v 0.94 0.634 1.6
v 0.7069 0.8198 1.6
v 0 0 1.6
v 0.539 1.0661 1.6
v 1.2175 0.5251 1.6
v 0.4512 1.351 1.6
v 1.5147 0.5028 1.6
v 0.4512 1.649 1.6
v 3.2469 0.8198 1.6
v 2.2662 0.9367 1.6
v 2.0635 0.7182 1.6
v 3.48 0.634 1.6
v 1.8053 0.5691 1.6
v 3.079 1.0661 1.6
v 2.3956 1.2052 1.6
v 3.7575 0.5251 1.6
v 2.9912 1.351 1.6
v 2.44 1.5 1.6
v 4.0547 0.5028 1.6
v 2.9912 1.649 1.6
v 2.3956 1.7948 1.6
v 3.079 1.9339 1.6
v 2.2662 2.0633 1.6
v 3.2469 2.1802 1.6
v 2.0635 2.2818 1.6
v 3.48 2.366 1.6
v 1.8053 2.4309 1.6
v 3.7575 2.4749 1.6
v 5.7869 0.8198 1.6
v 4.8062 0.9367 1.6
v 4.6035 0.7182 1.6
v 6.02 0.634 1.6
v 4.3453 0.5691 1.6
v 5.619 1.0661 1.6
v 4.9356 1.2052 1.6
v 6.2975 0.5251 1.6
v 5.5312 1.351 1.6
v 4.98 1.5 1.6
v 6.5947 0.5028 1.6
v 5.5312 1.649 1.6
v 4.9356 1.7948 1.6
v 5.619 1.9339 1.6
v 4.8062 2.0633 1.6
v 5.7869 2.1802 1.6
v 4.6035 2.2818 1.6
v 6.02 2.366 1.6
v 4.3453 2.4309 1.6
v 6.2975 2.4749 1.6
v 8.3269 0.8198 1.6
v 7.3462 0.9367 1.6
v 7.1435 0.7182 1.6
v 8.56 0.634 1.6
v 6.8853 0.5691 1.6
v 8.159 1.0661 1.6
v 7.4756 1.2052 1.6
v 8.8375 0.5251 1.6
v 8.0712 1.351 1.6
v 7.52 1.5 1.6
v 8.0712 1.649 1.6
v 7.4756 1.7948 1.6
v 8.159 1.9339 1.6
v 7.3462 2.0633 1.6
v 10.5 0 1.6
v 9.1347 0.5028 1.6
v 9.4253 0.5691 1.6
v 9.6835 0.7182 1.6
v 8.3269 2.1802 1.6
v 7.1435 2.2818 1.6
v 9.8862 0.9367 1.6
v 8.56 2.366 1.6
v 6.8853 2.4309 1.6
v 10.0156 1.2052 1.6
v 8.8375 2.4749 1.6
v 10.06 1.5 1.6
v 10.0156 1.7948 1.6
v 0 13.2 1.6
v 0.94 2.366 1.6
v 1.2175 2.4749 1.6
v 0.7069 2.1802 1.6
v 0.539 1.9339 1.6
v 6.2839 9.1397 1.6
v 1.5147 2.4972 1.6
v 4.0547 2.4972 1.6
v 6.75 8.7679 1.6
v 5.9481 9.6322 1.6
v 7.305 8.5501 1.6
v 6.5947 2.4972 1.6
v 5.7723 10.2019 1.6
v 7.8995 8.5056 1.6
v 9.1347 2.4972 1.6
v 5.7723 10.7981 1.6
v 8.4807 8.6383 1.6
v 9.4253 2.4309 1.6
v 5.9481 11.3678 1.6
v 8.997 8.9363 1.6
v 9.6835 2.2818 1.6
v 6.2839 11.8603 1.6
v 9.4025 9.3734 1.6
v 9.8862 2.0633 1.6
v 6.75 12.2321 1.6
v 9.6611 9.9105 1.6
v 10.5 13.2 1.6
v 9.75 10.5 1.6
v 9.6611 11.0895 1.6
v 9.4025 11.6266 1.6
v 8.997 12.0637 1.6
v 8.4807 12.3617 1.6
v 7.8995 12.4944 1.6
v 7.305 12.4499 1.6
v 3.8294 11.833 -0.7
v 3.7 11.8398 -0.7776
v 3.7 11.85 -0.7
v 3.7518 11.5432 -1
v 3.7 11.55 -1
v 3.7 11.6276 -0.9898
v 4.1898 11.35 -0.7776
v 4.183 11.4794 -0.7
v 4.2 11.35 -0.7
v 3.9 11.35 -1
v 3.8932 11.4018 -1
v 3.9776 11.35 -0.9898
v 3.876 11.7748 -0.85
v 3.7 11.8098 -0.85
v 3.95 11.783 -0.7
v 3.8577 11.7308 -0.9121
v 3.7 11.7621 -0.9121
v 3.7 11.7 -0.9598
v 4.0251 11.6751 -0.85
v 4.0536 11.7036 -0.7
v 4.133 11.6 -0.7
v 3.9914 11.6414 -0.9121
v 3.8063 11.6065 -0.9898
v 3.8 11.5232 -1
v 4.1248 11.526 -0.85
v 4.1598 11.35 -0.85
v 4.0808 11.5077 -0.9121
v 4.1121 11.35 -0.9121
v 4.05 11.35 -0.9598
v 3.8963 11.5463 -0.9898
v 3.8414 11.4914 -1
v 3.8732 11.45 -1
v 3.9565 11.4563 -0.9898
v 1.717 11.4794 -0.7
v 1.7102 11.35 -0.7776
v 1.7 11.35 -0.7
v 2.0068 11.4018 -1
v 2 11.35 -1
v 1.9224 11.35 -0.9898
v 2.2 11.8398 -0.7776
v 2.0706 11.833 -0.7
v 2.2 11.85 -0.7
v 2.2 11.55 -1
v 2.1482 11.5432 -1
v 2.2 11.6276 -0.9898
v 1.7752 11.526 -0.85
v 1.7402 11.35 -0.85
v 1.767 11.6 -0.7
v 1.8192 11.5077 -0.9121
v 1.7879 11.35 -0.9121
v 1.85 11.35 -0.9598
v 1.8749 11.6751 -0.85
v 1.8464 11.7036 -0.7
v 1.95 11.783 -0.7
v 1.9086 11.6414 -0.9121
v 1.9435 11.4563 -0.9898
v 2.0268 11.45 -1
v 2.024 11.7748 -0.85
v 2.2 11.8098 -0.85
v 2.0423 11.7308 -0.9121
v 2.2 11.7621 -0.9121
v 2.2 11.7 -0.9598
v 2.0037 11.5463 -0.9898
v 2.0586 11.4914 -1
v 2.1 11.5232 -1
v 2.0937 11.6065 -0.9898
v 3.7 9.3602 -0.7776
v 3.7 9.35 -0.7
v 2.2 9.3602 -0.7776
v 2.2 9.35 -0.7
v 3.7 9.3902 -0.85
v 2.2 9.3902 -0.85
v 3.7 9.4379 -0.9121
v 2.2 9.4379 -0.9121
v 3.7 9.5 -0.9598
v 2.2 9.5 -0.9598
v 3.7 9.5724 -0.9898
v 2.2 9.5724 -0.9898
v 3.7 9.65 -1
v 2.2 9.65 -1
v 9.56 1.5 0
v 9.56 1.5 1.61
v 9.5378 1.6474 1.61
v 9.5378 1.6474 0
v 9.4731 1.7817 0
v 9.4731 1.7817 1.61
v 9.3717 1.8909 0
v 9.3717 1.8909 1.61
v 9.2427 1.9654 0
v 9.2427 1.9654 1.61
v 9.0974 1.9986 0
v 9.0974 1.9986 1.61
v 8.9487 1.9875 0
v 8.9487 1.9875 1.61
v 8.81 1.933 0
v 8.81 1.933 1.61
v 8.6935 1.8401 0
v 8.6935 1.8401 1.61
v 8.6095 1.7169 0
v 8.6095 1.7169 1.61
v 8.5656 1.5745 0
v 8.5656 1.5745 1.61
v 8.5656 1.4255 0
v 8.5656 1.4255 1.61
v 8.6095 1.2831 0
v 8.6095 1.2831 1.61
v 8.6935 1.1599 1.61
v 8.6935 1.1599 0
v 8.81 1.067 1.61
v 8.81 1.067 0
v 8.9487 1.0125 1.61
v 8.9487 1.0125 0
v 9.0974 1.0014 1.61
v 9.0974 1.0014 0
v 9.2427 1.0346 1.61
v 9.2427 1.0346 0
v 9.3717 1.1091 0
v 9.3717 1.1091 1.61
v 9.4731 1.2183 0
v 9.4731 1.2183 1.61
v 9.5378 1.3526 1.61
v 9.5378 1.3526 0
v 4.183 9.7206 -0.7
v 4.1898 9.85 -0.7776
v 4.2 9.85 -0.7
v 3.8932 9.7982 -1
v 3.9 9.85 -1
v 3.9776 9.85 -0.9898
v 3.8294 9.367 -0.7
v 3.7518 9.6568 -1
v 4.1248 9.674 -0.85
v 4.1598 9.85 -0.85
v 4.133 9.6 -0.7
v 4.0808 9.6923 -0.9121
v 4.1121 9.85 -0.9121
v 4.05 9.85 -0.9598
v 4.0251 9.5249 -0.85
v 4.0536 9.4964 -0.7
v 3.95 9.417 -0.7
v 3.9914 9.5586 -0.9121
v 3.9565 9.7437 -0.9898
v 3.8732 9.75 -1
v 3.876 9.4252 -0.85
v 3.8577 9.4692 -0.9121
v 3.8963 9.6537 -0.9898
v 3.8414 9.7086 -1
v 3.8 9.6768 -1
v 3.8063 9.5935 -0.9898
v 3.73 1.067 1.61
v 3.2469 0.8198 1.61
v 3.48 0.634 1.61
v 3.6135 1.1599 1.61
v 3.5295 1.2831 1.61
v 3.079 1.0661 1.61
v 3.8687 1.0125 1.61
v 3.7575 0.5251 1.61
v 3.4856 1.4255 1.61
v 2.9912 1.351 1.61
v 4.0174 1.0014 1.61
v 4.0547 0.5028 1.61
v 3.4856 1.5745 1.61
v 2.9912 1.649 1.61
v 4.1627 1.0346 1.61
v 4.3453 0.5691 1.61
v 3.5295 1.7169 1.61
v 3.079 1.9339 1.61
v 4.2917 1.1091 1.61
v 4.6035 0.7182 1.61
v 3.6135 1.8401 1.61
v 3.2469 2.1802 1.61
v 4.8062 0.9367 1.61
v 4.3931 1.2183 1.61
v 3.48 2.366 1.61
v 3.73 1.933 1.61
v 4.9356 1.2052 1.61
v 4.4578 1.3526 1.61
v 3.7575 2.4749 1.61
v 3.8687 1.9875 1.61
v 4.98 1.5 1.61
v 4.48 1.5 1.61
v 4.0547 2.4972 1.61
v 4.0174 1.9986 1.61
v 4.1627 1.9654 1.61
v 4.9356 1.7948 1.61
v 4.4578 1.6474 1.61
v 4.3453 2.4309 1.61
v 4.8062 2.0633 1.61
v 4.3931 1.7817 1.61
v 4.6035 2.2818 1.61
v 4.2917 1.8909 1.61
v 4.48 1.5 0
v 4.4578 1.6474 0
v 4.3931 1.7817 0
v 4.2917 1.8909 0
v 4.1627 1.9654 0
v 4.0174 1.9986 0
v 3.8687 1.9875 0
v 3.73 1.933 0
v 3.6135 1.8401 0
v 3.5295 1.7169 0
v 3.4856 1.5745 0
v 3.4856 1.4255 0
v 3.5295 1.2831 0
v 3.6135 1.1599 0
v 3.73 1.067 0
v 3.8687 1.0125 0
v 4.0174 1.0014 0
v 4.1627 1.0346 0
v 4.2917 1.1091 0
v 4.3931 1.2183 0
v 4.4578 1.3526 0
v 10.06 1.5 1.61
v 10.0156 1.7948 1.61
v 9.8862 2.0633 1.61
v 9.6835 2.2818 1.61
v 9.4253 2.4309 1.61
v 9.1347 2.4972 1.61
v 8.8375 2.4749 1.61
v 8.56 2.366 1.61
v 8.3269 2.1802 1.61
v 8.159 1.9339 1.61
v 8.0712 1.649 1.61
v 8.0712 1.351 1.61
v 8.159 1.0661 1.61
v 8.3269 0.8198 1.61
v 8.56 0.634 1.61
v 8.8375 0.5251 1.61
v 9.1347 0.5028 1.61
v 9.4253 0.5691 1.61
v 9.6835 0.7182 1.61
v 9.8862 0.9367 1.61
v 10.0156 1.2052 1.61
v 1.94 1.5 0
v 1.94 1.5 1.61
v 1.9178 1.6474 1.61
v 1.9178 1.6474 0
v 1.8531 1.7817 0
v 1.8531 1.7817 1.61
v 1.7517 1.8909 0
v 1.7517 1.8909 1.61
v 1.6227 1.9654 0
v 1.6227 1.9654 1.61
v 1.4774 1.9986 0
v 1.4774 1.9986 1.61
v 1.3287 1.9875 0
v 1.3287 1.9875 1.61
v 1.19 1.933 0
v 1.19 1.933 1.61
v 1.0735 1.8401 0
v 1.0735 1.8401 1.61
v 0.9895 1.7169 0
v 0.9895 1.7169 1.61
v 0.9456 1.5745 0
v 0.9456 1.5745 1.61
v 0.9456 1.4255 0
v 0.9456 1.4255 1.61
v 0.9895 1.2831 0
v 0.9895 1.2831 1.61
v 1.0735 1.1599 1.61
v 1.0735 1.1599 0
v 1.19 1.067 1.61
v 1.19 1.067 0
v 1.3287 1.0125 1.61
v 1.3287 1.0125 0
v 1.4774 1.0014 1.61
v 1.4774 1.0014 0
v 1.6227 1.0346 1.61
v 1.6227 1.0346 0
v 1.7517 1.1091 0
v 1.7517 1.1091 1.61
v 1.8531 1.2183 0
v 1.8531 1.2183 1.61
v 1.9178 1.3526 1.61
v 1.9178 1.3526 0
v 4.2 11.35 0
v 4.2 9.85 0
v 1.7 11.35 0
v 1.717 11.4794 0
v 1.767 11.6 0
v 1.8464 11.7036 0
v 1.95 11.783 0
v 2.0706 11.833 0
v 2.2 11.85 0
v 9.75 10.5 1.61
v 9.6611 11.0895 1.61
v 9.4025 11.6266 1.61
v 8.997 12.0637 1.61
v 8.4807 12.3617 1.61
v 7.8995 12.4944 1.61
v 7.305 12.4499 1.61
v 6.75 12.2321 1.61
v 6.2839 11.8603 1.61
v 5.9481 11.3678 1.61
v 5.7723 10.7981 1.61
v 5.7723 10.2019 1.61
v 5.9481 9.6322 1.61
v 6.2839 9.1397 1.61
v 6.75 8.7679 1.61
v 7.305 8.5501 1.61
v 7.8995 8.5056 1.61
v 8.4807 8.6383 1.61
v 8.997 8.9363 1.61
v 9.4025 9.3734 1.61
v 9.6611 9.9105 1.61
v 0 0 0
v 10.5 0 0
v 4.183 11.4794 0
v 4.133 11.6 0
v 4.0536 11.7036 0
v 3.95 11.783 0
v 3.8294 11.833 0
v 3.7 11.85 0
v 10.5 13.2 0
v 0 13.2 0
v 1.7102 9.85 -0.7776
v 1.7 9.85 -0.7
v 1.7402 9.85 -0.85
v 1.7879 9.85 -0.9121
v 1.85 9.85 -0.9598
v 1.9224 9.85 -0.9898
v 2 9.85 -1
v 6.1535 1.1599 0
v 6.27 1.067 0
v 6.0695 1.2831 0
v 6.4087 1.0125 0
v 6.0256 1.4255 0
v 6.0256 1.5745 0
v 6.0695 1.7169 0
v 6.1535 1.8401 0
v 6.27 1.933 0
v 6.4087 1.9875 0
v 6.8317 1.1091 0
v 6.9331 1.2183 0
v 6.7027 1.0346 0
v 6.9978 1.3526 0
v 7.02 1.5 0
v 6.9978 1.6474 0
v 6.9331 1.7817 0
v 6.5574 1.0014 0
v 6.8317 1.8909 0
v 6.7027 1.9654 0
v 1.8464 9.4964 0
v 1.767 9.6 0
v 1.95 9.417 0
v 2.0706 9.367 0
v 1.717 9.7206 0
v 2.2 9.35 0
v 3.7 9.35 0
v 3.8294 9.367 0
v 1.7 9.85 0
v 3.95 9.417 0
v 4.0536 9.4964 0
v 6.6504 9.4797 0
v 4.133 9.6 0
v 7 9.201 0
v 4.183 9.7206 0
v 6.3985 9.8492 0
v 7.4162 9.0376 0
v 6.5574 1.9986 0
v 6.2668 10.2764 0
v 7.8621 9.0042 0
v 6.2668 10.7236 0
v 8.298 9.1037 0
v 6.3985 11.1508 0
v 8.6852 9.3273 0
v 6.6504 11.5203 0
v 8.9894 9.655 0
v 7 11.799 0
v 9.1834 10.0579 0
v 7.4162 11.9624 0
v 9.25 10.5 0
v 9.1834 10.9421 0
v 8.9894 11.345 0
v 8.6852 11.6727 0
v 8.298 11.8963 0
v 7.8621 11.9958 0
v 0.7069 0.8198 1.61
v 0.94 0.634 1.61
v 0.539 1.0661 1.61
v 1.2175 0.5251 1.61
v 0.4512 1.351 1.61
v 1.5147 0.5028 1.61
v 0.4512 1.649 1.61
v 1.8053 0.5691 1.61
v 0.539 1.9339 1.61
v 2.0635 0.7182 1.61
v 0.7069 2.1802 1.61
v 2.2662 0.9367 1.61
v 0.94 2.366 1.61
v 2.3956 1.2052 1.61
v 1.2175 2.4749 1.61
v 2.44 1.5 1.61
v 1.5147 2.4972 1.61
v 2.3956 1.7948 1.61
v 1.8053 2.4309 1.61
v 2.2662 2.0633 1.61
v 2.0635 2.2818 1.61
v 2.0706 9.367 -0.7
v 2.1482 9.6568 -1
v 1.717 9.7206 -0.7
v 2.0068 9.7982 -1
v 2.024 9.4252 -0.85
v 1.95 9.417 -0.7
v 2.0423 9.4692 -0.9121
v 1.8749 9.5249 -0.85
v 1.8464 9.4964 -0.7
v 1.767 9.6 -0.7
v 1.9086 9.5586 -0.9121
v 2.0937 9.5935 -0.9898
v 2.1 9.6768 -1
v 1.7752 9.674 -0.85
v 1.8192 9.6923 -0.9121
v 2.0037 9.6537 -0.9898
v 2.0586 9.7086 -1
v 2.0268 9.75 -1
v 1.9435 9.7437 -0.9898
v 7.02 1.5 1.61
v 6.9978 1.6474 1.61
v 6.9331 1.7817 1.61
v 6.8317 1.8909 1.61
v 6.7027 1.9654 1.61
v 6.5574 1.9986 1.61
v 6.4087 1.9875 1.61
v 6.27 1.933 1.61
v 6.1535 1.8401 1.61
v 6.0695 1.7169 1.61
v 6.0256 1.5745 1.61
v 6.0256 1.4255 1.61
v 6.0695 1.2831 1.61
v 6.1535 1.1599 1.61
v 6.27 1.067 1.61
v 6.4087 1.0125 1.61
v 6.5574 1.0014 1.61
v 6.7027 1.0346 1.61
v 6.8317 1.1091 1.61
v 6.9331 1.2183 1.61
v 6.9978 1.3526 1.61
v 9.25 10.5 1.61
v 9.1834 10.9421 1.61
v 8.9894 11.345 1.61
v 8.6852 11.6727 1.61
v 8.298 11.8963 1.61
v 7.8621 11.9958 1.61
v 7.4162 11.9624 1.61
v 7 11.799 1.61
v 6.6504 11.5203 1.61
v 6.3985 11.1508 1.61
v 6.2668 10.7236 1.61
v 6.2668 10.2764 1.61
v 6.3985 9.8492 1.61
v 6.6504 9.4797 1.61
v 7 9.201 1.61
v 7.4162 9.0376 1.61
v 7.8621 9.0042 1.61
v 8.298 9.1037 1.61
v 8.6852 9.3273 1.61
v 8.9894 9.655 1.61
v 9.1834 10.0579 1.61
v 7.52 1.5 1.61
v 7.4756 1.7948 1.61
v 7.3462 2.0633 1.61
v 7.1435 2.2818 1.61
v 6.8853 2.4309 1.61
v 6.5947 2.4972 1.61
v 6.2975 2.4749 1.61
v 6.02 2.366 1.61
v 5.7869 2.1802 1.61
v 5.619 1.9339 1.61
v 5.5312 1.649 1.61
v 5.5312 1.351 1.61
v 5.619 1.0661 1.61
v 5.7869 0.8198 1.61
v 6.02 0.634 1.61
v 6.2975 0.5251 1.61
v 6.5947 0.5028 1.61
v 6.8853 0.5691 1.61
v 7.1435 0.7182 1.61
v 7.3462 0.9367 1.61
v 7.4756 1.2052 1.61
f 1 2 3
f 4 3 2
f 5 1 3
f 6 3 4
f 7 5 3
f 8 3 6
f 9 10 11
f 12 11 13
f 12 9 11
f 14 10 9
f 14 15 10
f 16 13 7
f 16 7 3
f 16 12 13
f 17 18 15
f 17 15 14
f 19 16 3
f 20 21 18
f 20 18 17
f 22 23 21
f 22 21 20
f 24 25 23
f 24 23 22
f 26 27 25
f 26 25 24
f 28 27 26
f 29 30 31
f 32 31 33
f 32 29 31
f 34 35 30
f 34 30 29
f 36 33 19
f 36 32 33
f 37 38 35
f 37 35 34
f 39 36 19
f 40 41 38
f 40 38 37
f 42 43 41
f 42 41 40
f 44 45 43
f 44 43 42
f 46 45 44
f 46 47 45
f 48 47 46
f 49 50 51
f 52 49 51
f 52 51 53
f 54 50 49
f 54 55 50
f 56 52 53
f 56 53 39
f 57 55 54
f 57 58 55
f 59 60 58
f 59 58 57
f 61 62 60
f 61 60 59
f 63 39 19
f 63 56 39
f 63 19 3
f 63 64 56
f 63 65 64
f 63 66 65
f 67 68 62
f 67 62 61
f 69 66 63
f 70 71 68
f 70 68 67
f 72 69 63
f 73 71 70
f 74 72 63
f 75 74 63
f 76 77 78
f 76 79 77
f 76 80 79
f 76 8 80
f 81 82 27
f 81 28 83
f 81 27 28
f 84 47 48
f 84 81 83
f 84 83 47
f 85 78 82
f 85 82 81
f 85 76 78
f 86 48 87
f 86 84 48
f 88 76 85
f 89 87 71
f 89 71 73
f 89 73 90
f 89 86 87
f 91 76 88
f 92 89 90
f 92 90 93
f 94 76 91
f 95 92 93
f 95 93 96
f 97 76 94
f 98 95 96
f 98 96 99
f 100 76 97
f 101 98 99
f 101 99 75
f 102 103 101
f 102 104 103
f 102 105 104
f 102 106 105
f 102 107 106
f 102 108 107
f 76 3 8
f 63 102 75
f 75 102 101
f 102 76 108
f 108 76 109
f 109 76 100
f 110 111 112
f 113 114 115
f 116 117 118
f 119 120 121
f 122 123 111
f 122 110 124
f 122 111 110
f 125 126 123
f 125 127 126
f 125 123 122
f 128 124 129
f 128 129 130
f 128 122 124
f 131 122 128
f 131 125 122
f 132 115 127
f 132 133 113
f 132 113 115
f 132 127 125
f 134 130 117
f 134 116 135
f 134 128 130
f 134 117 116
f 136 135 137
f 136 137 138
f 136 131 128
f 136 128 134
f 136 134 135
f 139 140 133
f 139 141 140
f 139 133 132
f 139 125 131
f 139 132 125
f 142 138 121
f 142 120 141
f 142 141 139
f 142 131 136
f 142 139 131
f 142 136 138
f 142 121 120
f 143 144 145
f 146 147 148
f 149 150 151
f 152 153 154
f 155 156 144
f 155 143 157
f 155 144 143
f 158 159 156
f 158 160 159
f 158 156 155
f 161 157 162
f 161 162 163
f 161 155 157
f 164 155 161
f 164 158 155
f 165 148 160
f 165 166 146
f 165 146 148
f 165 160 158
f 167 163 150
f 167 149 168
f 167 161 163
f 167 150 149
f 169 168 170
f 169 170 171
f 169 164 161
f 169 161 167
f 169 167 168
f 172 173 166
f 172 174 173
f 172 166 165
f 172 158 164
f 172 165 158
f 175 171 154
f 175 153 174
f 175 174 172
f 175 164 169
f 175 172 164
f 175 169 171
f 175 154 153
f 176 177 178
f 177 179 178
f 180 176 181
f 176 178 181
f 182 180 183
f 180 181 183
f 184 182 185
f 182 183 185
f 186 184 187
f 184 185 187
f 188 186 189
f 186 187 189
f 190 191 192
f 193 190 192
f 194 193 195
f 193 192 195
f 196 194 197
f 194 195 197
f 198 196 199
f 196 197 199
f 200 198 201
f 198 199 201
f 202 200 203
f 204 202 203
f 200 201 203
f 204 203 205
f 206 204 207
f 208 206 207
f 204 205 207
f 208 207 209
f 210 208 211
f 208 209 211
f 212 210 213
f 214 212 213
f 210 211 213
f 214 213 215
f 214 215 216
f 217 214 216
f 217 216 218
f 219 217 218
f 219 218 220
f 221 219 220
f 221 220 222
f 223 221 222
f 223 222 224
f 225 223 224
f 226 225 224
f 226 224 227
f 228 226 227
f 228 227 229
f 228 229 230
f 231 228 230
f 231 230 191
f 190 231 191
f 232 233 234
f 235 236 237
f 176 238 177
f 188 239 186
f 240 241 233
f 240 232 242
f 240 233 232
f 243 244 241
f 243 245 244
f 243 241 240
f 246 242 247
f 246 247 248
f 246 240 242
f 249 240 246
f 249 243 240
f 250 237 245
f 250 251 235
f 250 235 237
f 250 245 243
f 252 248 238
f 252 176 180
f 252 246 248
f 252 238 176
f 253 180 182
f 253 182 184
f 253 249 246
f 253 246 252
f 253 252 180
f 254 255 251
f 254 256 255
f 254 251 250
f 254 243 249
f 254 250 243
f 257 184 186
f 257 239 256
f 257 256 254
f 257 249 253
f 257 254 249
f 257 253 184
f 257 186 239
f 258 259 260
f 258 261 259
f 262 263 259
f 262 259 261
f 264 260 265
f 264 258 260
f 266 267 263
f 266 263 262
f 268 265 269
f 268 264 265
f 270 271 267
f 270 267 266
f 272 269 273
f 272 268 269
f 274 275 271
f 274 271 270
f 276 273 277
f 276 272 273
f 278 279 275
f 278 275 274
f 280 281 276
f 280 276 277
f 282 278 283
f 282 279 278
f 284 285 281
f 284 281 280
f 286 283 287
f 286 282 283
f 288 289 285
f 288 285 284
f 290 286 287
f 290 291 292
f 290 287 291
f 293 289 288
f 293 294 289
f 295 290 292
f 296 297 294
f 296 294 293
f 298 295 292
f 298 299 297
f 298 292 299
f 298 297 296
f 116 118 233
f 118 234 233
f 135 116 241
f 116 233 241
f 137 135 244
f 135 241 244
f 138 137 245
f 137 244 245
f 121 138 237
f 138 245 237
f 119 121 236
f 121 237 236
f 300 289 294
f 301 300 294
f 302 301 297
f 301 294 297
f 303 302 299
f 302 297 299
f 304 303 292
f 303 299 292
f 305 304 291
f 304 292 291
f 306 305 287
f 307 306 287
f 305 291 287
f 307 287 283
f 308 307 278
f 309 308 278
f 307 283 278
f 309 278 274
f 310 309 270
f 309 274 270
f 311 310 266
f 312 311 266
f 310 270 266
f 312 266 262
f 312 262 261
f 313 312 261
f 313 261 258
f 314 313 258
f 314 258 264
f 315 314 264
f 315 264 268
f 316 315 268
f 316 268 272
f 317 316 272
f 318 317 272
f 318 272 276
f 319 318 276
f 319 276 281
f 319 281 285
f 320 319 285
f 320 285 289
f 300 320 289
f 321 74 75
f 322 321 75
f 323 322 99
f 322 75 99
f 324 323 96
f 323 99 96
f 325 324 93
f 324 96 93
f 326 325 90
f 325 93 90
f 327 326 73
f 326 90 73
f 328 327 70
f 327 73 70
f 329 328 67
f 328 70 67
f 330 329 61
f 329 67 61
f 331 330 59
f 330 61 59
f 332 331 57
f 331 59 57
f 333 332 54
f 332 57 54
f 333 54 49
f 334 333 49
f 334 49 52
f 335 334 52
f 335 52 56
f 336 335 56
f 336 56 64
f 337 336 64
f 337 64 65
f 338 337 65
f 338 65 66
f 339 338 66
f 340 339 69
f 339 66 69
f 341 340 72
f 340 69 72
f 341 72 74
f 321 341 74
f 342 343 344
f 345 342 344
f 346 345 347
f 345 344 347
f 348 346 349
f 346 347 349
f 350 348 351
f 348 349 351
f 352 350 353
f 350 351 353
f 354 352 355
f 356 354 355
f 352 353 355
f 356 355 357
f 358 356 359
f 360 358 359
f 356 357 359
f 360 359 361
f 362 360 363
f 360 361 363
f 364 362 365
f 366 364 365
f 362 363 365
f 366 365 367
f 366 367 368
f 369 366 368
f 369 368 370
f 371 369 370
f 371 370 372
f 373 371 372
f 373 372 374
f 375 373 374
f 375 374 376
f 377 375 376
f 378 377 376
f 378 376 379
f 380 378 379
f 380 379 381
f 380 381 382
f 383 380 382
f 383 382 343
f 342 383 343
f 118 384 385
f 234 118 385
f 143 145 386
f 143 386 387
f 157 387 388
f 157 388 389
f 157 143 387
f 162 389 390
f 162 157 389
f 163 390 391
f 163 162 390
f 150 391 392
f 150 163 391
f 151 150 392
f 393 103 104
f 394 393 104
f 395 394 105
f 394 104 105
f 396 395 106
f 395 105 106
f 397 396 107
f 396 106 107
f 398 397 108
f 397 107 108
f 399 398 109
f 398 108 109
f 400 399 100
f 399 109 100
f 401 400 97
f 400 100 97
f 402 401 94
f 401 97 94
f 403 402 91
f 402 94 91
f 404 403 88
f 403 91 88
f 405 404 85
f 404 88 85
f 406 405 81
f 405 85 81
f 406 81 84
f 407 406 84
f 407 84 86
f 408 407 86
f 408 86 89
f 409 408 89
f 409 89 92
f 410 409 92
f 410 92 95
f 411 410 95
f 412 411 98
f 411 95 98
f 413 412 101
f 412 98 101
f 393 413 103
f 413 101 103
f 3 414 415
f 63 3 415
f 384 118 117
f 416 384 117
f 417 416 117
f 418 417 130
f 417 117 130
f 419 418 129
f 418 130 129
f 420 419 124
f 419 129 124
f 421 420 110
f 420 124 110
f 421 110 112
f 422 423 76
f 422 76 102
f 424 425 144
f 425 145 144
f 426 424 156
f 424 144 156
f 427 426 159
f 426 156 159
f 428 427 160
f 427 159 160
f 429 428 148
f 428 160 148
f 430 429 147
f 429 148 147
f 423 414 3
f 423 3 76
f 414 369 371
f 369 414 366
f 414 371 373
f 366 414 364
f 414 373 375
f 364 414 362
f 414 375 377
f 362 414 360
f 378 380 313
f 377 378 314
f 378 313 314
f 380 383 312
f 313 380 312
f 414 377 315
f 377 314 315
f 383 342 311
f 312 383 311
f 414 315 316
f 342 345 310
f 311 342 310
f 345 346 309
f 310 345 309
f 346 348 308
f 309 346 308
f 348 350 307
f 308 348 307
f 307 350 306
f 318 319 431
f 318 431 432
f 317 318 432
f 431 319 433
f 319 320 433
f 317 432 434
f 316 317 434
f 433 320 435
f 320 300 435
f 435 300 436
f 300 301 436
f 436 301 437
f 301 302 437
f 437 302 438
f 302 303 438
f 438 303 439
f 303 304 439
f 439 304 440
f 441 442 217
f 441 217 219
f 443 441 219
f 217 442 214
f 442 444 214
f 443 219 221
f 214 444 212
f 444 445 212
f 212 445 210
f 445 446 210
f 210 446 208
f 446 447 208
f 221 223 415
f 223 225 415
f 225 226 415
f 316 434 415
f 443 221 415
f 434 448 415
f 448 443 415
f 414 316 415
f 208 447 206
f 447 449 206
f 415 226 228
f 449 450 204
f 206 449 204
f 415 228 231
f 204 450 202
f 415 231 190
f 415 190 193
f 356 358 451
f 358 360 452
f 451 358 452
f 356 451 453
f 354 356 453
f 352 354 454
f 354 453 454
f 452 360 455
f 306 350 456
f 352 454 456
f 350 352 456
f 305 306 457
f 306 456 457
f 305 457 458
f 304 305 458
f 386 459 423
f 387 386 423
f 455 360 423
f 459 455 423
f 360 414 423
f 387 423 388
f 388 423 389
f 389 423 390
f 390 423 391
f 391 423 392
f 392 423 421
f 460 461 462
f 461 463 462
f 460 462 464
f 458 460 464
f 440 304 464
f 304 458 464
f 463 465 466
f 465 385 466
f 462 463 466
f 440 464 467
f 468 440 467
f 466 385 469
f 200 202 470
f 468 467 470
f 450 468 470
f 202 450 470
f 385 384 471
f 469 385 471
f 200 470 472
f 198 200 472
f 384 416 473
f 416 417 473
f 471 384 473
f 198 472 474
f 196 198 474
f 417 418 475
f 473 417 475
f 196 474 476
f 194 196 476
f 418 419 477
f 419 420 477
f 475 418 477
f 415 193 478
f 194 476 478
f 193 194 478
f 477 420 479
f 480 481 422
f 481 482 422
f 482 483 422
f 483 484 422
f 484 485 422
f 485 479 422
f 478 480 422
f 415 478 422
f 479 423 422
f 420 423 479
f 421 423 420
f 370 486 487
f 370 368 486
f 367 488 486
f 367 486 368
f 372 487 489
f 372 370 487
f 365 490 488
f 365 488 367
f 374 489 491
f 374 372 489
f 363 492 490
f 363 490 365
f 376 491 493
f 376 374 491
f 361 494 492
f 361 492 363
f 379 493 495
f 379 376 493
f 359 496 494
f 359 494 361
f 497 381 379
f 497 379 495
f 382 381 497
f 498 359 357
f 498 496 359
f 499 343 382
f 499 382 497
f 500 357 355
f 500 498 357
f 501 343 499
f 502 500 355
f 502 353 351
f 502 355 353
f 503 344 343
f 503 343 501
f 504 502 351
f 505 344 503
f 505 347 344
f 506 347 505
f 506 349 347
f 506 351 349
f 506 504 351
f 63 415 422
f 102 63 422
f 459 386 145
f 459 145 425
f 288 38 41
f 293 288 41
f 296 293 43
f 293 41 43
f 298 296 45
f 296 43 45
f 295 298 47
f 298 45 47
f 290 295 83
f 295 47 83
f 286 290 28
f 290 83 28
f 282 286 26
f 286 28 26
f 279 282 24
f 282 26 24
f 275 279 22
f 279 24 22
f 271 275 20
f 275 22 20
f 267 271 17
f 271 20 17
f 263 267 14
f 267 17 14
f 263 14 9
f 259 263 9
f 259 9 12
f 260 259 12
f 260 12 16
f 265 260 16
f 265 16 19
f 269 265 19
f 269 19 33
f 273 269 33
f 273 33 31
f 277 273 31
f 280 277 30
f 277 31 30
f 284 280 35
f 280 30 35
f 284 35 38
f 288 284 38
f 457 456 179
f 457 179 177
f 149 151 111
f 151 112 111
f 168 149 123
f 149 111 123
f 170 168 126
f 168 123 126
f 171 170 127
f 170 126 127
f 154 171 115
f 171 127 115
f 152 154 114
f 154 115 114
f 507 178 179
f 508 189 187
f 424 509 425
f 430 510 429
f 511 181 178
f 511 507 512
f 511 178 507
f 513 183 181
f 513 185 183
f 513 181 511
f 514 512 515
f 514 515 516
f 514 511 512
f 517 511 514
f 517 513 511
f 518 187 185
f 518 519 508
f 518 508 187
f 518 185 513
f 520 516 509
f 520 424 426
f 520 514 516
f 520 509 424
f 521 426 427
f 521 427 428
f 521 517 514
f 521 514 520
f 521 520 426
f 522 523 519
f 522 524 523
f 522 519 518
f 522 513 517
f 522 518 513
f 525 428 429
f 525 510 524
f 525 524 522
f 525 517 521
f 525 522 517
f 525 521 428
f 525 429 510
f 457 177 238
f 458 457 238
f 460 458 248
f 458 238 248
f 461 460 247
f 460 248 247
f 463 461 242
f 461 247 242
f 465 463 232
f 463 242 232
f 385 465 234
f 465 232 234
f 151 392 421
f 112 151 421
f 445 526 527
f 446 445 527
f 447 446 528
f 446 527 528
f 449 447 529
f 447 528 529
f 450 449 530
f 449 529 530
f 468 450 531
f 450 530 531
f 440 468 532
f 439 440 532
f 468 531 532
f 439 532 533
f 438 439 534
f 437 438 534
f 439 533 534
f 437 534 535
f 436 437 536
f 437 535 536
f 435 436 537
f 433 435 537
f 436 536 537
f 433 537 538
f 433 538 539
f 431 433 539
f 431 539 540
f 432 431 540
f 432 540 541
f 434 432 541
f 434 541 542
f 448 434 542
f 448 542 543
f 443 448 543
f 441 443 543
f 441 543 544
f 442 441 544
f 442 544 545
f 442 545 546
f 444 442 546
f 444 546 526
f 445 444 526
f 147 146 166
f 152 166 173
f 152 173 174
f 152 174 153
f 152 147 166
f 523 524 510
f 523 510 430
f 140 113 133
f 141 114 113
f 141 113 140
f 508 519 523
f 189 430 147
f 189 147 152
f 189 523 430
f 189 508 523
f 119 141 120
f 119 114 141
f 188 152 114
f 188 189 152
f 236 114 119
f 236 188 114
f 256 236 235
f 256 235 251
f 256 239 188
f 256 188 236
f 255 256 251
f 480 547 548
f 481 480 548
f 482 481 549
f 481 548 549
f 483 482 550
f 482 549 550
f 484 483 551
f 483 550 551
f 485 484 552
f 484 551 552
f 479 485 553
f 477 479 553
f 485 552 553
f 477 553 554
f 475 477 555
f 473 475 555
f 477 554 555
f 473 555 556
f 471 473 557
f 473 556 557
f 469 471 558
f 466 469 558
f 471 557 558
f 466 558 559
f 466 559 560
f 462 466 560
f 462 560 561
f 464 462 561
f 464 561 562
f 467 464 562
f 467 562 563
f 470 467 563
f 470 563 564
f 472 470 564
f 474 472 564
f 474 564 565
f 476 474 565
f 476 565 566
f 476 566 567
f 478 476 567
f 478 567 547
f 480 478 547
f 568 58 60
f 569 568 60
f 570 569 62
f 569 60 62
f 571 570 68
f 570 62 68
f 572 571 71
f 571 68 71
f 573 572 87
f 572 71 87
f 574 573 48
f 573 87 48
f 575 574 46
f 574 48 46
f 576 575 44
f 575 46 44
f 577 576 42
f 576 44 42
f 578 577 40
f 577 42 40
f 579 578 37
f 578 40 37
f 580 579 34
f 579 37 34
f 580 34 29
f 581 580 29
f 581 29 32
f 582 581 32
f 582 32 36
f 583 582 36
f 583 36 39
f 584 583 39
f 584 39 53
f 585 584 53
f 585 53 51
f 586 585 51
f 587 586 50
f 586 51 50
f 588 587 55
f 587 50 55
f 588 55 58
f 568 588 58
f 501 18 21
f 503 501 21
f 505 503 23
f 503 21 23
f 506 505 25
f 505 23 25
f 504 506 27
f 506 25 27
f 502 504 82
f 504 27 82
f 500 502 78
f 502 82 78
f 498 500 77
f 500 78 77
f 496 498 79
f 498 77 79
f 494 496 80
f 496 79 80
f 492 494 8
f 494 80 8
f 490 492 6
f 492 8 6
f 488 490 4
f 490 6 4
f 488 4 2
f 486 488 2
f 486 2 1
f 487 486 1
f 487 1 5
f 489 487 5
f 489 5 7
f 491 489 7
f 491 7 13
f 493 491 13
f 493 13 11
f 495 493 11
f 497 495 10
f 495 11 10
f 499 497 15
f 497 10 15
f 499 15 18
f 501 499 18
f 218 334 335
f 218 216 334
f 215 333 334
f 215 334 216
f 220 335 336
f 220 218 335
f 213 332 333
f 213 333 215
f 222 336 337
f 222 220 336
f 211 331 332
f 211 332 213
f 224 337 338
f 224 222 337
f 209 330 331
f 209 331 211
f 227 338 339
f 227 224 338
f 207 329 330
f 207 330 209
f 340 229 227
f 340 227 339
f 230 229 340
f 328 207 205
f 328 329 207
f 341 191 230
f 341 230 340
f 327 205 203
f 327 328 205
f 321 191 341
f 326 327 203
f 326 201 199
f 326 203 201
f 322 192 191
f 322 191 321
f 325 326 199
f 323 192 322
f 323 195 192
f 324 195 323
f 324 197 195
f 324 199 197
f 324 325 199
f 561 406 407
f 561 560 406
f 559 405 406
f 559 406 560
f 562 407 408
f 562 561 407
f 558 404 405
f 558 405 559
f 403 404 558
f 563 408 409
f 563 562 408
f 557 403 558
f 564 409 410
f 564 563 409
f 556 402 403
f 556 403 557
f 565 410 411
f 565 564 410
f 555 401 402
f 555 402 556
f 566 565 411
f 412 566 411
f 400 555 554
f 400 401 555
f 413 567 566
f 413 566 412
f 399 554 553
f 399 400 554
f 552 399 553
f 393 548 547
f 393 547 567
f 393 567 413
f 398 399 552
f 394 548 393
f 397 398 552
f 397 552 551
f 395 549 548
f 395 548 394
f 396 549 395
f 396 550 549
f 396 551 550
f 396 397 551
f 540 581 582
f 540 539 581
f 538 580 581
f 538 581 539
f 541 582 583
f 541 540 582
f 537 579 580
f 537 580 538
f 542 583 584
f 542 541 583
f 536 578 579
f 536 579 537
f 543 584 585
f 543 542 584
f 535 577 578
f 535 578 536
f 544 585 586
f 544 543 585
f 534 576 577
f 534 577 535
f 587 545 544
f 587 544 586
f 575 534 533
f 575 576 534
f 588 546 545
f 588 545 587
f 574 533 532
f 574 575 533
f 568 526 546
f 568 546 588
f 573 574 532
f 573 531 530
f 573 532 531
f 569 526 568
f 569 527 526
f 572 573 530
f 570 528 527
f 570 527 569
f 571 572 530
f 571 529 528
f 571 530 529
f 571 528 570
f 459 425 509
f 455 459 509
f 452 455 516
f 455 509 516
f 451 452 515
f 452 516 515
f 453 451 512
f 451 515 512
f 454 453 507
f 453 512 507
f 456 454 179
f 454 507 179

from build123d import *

# Parameters (mm, degrees)
BOX_W         = 10.5
BOX_H         = 13.2
BOX_DEPTH     = 1.6
SKETCH_R      = 1
SKETCH_R_2    = 2
PAD_DEPTH     = 0.01
SKETCH001_R   = 1.5
SKETCH001_R_2 = 0.5
POCKET_DEPTH  = 1.611
SKETCH002_W   = 2.5
SKETCH002_H   = 2.5
PAD001_DEPTH  = 1
FILLET_R      = 0.5
FILLET001_R   = 0.3


with BuildPart() as part:
    # Box → Box (new body)
    with BuildSketch(Plane.XY):
        with Locations((5.25, 6.6)):
            Rectangle(BOX_W, BOX_H)
    extrude(amount=BOX_DEPTH)

    # Sketch → Pad (new body)
    with BuildSketch(Plane.XY.offset(1.6)):
        with Locations((1.44, 1.5)):
            Circle(SKETCH_R)
        with Locations((3.98, 1.5)):
            Circle(SKETCH_R)
        with Locations((6.52, 1.5)):
            Circle(SKETCH_R)
        with Locations((9.06, 1.5)):
            Circle(SKETCH_R)
        with Locations((7.75, 10.5)):
            Circle(SKETCH_R_2)
    extrude(amount=PAD_DEPTH)

    # Sketch001 → Pocket (cut, through all)
    with BuildSketch(Plane.XY.offset(1.61)):
        with Locations((7.75, 10.5)):
            Circle(SKETCH001_R)
        with Locations((1.44, 1.5)):
            Circle(SKETCH001_R_2)
        with Locations((3.98, 1.5)):
            Circle(SKETCH001_R_2)
        with Locations((6.52, 1.5)):
            Circle(SKETCH001_R_2)
        with Locations((9.06, 1.5)):
            Circle(SKETCH001_R_2)
    extrude(amount=-POCKET_DEPTH, mode=Mode.SUBTRACT)

    # Sketch002 → Pad001 (new body)
    with BuildSketch(Plane(origin=(0, 0, 0), x_dir=(1, 0, 0), z_dir=(0, 0, -1))):
        with Locations((2.95, -10.6)):
            Rectangle(SKETCH002_W, SKETCH002_H)
    extrude(amount=PAD001_DEPTH)

    # Fillet
    fillet_edges = [part.edges().sort_by_distance(p)[0] for p in [
        (4.2, 11.85, -0.5),
        (1.7, 11.85, -0.5),
        (1.7, 9.35, -0.5),
        (4.2, 9.35, -0.5),
    ]]
    fillet(fillet_edges, radius=FILLET_R)

    # Fillet001
    fillet001_edges = [part.edges().sort_by_distance(p)[0] for p in [
        (4.2, 10.6, -1),
        (2.95, 9.35, -1),
        (1.7, 10.6, -1),
        (2.95, 11.85, -1),
    ]]
    fillet(fillet001_edges, radius=FILLET001_R)


solid = part.part
